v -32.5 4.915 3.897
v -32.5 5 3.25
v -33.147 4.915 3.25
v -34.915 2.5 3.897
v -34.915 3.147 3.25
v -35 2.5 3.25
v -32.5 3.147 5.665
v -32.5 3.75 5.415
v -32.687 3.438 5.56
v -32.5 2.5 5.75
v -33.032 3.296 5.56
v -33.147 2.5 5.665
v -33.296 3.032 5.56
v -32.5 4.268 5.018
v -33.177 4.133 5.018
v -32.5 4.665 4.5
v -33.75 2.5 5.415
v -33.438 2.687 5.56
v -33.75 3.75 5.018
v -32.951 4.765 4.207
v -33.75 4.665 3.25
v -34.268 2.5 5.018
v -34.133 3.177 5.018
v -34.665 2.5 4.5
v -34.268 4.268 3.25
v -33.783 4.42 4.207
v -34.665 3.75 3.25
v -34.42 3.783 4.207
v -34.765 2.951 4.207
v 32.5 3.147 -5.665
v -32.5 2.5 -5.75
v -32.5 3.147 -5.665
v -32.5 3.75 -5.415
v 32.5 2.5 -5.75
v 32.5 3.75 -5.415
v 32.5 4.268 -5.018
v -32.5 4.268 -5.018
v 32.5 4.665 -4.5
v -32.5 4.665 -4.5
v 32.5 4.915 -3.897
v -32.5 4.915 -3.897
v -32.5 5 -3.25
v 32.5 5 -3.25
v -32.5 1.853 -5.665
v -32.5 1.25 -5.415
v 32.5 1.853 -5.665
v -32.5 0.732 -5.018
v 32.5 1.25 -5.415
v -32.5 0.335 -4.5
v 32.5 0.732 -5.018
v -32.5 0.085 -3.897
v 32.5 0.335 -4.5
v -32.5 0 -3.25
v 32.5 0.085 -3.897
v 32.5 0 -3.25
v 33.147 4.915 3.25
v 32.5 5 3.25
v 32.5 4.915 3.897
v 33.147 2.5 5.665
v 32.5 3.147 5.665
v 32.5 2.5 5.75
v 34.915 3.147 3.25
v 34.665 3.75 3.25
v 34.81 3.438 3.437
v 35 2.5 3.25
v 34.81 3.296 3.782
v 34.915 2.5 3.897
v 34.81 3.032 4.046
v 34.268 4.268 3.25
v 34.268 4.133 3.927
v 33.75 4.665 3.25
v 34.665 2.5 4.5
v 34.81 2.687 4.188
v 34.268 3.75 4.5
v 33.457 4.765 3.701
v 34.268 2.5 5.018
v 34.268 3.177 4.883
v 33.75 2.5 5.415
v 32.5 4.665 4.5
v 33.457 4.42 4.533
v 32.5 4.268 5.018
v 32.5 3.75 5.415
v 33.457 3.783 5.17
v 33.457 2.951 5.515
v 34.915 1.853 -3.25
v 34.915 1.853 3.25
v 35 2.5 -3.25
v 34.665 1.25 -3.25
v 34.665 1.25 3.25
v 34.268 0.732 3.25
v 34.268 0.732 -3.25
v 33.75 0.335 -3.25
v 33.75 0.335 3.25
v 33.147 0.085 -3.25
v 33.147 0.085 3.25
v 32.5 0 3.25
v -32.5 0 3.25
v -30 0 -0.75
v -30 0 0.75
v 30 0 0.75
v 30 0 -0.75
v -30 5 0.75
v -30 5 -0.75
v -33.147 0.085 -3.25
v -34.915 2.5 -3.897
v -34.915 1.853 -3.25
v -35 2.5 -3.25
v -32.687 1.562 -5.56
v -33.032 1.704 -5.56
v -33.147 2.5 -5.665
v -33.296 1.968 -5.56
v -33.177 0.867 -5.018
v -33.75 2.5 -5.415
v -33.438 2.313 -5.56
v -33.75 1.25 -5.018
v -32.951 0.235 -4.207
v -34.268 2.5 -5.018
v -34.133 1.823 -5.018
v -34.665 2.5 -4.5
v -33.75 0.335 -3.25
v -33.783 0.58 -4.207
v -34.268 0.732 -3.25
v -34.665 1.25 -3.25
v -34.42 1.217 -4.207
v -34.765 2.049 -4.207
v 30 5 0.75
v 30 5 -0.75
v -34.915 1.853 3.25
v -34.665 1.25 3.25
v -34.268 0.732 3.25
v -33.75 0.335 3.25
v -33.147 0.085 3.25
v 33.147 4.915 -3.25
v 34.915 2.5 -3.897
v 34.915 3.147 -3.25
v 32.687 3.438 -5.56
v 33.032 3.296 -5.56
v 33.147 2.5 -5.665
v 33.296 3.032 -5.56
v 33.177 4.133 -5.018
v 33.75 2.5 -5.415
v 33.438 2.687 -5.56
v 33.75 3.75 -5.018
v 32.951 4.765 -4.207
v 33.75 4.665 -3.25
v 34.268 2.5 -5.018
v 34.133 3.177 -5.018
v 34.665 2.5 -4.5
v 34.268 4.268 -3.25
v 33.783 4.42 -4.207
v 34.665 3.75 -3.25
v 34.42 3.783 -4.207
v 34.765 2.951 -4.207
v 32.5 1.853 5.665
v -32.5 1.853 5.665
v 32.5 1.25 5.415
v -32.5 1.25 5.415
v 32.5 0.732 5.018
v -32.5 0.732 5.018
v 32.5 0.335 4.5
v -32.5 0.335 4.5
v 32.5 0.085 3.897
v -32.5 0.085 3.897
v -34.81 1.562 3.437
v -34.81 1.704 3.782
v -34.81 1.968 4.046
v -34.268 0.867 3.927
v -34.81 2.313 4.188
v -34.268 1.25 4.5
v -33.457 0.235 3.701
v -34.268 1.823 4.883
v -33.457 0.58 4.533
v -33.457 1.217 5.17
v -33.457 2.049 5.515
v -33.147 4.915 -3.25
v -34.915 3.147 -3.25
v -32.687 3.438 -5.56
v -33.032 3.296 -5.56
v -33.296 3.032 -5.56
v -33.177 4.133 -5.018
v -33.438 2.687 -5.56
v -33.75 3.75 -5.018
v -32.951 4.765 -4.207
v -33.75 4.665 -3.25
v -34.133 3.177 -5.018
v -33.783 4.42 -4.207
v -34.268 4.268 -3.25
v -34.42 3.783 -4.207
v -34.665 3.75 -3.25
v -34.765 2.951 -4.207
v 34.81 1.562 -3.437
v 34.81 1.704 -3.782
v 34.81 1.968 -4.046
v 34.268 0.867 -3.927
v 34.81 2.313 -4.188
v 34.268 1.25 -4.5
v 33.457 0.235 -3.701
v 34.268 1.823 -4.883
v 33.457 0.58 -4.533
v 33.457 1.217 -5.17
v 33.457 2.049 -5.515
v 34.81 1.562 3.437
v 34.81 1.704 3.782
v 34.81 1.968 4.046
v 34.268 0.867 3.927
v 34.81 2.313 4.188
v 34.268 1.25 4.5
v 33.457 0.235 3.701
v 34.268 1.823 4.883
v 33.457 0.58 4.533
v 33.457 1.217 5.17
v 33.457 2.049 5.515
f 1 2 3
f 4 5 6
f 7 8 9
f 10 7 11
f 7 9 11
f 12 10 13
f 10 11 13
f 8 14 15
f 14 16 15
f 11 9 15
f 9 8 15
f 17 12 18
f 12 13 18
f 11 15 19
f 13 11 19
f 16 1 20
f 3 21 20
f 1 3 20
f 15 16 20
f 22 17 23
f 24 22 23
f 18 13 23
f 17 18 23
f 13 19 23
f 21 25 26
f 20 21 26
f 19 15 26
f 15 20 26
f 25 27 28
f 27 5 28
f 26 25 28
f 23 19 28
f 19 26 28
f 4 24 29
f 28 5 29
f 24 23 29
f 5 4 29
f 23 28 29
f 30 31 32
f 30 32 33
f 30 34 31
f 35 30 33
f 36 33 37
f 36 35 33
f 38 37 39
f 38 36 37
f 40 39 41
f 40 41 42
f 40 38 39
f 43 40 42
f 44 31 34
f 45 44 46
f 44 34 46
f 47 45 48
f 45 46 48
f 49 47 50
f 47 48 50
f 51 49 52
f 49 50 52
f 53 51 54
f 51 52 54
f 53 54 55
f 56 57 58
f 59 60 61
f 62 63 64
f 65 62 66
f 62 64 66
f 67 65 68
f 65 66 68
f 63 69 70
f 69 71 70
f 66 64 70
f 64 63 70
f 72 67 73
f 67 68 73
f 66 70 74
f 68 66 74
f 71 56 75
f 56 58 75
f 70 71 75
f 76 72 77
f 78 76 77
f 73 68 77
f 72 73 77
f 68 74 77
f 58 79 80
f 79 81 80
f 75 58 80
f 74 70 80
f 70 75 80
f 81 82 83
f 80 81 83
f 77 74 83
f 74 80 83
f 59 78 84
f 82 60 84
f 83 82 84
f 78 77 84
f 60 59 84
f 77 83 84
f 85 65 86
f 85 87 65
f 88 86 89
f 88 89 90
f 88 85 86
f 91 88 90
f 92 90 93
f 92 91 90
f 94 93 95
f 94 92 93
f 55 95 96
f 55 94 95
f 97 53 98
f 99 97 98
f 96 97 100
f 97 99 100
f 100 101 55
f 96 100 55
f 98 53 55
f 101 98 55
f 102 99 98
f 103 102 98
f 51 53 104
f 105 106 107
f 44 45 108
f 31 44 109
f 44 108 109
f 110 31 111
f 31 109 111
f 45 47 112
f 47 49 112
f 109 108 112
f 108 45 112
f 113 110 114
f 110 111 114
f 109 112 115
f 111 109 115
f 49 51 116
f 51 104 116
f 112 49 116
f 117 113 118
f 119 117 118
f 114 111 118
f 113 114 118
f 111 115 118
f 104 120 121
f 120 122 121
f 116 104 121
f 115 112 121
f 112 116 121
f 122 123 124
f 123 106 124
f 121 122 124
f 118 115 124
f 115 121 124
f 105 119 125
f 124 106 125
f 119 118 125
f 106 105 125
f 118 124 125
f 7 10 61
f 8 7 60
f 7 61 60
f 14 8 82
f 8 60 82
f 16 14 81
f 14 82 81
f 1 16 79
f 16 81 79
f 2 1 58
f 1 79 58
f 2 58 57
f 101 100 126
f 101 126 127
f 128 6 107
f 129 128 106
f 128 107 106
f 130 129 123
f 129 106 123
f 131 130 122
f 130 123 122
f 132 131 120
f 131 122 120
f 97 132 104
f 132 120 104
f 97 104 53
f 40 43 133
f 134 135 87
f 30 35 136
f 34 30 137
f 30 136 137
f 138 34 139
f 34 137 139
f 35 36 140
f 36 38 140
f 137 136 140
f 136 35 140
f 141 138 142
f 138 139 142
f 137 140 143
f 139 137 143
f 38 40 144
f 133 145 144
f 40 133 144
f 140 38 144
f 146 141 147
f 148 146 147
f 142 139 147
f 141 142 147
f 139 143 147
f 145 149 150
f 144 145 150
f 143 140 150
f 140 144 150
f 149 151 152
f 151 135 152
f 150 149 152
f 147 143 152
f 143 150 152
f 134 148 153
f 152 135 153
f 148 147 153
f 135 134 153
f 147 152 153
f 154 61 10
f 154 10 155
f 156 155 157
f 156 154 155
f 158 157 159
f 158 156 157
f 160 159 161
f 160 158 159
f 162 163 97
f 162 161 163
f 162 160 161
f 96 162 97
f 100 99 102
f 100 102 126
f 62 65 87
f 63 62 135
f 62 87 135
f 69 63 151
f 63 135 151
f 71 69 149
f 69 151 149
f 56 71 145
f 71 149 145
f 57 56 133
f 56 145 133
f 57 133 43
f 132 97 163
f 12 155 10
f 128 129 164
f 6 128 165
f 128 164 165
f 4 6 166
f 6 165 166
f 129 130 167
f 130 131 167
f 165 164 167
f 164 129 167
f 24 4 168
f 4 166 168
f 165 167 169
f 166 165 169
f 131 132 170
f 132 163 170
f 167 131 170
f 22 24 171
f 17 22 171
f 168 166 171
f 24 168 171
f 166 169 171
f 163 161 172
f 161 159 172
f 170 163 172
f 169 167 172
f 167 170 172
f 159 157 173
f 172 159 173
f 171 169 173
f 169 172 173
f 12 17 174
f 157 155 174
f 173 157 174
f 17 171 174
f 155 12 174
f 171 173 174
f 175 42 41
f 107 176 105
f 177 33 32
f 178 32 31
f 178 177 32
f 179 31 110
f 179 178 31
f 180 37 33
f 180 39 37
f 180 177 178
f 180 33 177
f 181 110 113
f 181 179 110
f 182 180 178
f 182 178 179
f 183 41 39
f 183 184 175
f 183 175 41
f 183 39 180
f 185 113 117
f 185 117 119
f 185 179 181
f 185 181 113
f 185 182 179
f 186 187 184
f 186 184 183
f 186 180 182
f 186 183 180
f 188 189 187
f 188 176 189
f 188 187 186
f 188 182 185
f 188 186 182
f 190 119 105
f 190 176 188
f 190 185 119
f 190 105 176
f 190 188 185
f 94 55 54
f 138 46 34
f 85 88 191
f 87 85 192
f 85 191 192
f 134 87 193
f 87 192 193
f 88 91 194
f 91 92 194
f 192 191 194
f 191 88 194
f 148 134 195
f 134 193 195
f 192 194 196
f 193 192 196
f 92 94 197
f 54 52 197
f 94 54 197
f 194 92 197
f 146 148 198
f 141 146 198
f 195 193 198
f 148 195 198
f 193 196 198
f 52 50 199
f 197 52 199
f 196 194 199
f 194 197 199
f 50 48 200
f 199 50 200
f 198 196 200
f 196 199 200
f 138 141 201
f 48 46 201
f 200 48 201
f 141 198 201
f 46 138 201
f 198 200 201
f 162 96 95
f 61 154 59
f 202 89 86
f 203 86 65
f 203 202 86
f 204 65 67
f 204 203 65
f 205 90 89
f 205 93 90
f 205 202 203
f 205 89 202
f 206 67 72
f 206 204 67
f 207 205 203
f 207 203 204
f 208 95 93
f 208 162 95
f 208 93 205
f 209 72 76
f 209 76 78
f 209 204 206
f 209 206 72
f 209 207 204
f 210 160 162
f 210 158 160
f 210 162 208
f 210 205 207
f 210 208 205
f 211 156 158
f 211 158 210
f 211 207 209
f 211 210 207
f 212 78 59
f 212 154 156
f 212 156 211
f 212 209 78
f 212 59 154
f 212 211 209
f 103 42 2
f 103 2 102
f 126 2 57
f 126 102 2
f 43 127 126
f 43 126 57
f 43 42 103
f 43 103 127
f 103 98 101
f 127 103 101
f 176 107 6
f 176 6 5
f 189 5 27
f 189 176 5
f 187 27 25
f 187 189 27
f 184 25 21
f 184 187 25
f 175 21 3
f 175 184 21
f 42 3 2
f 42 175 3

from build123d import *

# Parameters (mm, degrees)
ESQUISSE4_W        = 70
ESQUISSE4_H        = 11.5
ESQUISSE4_W_2      = 60
ESQUISSE4_H_2      = 1.5
BOSS_EXTRU_2_DEPTH = 5
CONG_1_R           = 2.5


with BuildPart() as part:
    # Esquisse4 → Boss.-Extru.2 (new body)
    with BuildSketch(Plane(origin=(0, 0, 0), x_dir=(1, 0, 0), z_dir=(0, 1, 0))):
        Rectangle(ESQUISSE4_W, ESQUISSE4_H)
        Rectangle(ESQUISSE4_W_2, ESQUISSE4_H_2, mode=Mode.SUBTRACT)
    extrude(amount=BOSS_EXTRU_2_DEPTH)

    # Congé1
    cong_1_edges = [part.edges().sort_by_distance(p)[0] for p in [
        (-35, 5, 0),
        (0, 5, 5.75),
        (35, 5, 0),
        (0, 0, 5.75),
        (-35, 0, 0),
        (0, 0, -5.75),
        (35, 0, 0),
        (0, 5, -5.75),
        (35, 2.5, 5.75),
        (-35, 2.5, 5.75),
        (-35, 2.5, -5.75),
        (35, 2.5, -5.75),
    ]]
    fillet(cong_1_edges, radius=CONG_1_R - 0.0001)  # a hair under: the kernel refuses the full size


solid = part.part
